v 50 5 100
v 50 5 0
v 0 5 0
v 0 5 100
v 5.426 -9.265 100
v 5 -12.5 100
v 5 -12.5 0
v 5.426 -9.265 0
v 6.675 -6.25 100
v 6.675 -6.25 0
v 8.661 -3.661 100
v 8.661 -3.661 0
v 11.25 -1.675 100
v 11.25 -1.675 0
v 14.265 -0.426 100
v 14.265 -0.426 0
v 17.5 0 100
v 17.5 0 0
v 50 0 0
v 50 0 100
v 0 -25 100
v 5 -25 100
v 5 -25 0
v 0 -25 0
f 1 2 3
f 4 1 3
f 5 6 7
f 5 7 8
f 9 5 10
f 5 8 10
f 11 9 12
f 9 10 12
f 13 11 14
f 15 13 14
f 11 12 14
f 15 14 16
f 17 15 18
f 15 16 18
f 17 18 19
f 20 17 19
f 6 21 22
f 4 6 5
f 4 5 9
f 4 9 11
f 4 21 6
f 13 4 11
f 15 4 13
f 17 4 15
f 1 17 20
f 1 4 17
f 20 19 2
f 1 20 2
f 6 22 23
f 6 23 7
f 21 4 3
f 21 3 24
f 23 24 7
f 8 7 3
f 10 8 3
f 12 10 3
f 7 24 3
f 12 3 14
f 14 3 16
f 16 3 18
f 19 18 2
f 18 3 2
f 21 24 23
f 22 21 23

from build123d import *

# Parameters (mm, degrees)
F1_DEPTH = 100


with BuildPart() as f1:
    # F0 (on Top) → F1 (new body)
    with BuildSketch(Plane.XY):
        Polygon((5, 0), (0, 0), (0, -25), (5, -25), (5, -12.5), align=None)
        Polygon((0, 5), (0, 0), (5, 0), (17.5, 0), (50, 0), (50, 5), align=None)
        with BuildLine():
            Line((17.5, 0), (5, 0))
            Line((5, 0), (5, -12.5))
            ThreePointArc((5, -12.5), (8.661165, -3.661165), (17.5, 0))
        make_face()
    extrude(amount=F1_DEPTH)


solid = f1.part
